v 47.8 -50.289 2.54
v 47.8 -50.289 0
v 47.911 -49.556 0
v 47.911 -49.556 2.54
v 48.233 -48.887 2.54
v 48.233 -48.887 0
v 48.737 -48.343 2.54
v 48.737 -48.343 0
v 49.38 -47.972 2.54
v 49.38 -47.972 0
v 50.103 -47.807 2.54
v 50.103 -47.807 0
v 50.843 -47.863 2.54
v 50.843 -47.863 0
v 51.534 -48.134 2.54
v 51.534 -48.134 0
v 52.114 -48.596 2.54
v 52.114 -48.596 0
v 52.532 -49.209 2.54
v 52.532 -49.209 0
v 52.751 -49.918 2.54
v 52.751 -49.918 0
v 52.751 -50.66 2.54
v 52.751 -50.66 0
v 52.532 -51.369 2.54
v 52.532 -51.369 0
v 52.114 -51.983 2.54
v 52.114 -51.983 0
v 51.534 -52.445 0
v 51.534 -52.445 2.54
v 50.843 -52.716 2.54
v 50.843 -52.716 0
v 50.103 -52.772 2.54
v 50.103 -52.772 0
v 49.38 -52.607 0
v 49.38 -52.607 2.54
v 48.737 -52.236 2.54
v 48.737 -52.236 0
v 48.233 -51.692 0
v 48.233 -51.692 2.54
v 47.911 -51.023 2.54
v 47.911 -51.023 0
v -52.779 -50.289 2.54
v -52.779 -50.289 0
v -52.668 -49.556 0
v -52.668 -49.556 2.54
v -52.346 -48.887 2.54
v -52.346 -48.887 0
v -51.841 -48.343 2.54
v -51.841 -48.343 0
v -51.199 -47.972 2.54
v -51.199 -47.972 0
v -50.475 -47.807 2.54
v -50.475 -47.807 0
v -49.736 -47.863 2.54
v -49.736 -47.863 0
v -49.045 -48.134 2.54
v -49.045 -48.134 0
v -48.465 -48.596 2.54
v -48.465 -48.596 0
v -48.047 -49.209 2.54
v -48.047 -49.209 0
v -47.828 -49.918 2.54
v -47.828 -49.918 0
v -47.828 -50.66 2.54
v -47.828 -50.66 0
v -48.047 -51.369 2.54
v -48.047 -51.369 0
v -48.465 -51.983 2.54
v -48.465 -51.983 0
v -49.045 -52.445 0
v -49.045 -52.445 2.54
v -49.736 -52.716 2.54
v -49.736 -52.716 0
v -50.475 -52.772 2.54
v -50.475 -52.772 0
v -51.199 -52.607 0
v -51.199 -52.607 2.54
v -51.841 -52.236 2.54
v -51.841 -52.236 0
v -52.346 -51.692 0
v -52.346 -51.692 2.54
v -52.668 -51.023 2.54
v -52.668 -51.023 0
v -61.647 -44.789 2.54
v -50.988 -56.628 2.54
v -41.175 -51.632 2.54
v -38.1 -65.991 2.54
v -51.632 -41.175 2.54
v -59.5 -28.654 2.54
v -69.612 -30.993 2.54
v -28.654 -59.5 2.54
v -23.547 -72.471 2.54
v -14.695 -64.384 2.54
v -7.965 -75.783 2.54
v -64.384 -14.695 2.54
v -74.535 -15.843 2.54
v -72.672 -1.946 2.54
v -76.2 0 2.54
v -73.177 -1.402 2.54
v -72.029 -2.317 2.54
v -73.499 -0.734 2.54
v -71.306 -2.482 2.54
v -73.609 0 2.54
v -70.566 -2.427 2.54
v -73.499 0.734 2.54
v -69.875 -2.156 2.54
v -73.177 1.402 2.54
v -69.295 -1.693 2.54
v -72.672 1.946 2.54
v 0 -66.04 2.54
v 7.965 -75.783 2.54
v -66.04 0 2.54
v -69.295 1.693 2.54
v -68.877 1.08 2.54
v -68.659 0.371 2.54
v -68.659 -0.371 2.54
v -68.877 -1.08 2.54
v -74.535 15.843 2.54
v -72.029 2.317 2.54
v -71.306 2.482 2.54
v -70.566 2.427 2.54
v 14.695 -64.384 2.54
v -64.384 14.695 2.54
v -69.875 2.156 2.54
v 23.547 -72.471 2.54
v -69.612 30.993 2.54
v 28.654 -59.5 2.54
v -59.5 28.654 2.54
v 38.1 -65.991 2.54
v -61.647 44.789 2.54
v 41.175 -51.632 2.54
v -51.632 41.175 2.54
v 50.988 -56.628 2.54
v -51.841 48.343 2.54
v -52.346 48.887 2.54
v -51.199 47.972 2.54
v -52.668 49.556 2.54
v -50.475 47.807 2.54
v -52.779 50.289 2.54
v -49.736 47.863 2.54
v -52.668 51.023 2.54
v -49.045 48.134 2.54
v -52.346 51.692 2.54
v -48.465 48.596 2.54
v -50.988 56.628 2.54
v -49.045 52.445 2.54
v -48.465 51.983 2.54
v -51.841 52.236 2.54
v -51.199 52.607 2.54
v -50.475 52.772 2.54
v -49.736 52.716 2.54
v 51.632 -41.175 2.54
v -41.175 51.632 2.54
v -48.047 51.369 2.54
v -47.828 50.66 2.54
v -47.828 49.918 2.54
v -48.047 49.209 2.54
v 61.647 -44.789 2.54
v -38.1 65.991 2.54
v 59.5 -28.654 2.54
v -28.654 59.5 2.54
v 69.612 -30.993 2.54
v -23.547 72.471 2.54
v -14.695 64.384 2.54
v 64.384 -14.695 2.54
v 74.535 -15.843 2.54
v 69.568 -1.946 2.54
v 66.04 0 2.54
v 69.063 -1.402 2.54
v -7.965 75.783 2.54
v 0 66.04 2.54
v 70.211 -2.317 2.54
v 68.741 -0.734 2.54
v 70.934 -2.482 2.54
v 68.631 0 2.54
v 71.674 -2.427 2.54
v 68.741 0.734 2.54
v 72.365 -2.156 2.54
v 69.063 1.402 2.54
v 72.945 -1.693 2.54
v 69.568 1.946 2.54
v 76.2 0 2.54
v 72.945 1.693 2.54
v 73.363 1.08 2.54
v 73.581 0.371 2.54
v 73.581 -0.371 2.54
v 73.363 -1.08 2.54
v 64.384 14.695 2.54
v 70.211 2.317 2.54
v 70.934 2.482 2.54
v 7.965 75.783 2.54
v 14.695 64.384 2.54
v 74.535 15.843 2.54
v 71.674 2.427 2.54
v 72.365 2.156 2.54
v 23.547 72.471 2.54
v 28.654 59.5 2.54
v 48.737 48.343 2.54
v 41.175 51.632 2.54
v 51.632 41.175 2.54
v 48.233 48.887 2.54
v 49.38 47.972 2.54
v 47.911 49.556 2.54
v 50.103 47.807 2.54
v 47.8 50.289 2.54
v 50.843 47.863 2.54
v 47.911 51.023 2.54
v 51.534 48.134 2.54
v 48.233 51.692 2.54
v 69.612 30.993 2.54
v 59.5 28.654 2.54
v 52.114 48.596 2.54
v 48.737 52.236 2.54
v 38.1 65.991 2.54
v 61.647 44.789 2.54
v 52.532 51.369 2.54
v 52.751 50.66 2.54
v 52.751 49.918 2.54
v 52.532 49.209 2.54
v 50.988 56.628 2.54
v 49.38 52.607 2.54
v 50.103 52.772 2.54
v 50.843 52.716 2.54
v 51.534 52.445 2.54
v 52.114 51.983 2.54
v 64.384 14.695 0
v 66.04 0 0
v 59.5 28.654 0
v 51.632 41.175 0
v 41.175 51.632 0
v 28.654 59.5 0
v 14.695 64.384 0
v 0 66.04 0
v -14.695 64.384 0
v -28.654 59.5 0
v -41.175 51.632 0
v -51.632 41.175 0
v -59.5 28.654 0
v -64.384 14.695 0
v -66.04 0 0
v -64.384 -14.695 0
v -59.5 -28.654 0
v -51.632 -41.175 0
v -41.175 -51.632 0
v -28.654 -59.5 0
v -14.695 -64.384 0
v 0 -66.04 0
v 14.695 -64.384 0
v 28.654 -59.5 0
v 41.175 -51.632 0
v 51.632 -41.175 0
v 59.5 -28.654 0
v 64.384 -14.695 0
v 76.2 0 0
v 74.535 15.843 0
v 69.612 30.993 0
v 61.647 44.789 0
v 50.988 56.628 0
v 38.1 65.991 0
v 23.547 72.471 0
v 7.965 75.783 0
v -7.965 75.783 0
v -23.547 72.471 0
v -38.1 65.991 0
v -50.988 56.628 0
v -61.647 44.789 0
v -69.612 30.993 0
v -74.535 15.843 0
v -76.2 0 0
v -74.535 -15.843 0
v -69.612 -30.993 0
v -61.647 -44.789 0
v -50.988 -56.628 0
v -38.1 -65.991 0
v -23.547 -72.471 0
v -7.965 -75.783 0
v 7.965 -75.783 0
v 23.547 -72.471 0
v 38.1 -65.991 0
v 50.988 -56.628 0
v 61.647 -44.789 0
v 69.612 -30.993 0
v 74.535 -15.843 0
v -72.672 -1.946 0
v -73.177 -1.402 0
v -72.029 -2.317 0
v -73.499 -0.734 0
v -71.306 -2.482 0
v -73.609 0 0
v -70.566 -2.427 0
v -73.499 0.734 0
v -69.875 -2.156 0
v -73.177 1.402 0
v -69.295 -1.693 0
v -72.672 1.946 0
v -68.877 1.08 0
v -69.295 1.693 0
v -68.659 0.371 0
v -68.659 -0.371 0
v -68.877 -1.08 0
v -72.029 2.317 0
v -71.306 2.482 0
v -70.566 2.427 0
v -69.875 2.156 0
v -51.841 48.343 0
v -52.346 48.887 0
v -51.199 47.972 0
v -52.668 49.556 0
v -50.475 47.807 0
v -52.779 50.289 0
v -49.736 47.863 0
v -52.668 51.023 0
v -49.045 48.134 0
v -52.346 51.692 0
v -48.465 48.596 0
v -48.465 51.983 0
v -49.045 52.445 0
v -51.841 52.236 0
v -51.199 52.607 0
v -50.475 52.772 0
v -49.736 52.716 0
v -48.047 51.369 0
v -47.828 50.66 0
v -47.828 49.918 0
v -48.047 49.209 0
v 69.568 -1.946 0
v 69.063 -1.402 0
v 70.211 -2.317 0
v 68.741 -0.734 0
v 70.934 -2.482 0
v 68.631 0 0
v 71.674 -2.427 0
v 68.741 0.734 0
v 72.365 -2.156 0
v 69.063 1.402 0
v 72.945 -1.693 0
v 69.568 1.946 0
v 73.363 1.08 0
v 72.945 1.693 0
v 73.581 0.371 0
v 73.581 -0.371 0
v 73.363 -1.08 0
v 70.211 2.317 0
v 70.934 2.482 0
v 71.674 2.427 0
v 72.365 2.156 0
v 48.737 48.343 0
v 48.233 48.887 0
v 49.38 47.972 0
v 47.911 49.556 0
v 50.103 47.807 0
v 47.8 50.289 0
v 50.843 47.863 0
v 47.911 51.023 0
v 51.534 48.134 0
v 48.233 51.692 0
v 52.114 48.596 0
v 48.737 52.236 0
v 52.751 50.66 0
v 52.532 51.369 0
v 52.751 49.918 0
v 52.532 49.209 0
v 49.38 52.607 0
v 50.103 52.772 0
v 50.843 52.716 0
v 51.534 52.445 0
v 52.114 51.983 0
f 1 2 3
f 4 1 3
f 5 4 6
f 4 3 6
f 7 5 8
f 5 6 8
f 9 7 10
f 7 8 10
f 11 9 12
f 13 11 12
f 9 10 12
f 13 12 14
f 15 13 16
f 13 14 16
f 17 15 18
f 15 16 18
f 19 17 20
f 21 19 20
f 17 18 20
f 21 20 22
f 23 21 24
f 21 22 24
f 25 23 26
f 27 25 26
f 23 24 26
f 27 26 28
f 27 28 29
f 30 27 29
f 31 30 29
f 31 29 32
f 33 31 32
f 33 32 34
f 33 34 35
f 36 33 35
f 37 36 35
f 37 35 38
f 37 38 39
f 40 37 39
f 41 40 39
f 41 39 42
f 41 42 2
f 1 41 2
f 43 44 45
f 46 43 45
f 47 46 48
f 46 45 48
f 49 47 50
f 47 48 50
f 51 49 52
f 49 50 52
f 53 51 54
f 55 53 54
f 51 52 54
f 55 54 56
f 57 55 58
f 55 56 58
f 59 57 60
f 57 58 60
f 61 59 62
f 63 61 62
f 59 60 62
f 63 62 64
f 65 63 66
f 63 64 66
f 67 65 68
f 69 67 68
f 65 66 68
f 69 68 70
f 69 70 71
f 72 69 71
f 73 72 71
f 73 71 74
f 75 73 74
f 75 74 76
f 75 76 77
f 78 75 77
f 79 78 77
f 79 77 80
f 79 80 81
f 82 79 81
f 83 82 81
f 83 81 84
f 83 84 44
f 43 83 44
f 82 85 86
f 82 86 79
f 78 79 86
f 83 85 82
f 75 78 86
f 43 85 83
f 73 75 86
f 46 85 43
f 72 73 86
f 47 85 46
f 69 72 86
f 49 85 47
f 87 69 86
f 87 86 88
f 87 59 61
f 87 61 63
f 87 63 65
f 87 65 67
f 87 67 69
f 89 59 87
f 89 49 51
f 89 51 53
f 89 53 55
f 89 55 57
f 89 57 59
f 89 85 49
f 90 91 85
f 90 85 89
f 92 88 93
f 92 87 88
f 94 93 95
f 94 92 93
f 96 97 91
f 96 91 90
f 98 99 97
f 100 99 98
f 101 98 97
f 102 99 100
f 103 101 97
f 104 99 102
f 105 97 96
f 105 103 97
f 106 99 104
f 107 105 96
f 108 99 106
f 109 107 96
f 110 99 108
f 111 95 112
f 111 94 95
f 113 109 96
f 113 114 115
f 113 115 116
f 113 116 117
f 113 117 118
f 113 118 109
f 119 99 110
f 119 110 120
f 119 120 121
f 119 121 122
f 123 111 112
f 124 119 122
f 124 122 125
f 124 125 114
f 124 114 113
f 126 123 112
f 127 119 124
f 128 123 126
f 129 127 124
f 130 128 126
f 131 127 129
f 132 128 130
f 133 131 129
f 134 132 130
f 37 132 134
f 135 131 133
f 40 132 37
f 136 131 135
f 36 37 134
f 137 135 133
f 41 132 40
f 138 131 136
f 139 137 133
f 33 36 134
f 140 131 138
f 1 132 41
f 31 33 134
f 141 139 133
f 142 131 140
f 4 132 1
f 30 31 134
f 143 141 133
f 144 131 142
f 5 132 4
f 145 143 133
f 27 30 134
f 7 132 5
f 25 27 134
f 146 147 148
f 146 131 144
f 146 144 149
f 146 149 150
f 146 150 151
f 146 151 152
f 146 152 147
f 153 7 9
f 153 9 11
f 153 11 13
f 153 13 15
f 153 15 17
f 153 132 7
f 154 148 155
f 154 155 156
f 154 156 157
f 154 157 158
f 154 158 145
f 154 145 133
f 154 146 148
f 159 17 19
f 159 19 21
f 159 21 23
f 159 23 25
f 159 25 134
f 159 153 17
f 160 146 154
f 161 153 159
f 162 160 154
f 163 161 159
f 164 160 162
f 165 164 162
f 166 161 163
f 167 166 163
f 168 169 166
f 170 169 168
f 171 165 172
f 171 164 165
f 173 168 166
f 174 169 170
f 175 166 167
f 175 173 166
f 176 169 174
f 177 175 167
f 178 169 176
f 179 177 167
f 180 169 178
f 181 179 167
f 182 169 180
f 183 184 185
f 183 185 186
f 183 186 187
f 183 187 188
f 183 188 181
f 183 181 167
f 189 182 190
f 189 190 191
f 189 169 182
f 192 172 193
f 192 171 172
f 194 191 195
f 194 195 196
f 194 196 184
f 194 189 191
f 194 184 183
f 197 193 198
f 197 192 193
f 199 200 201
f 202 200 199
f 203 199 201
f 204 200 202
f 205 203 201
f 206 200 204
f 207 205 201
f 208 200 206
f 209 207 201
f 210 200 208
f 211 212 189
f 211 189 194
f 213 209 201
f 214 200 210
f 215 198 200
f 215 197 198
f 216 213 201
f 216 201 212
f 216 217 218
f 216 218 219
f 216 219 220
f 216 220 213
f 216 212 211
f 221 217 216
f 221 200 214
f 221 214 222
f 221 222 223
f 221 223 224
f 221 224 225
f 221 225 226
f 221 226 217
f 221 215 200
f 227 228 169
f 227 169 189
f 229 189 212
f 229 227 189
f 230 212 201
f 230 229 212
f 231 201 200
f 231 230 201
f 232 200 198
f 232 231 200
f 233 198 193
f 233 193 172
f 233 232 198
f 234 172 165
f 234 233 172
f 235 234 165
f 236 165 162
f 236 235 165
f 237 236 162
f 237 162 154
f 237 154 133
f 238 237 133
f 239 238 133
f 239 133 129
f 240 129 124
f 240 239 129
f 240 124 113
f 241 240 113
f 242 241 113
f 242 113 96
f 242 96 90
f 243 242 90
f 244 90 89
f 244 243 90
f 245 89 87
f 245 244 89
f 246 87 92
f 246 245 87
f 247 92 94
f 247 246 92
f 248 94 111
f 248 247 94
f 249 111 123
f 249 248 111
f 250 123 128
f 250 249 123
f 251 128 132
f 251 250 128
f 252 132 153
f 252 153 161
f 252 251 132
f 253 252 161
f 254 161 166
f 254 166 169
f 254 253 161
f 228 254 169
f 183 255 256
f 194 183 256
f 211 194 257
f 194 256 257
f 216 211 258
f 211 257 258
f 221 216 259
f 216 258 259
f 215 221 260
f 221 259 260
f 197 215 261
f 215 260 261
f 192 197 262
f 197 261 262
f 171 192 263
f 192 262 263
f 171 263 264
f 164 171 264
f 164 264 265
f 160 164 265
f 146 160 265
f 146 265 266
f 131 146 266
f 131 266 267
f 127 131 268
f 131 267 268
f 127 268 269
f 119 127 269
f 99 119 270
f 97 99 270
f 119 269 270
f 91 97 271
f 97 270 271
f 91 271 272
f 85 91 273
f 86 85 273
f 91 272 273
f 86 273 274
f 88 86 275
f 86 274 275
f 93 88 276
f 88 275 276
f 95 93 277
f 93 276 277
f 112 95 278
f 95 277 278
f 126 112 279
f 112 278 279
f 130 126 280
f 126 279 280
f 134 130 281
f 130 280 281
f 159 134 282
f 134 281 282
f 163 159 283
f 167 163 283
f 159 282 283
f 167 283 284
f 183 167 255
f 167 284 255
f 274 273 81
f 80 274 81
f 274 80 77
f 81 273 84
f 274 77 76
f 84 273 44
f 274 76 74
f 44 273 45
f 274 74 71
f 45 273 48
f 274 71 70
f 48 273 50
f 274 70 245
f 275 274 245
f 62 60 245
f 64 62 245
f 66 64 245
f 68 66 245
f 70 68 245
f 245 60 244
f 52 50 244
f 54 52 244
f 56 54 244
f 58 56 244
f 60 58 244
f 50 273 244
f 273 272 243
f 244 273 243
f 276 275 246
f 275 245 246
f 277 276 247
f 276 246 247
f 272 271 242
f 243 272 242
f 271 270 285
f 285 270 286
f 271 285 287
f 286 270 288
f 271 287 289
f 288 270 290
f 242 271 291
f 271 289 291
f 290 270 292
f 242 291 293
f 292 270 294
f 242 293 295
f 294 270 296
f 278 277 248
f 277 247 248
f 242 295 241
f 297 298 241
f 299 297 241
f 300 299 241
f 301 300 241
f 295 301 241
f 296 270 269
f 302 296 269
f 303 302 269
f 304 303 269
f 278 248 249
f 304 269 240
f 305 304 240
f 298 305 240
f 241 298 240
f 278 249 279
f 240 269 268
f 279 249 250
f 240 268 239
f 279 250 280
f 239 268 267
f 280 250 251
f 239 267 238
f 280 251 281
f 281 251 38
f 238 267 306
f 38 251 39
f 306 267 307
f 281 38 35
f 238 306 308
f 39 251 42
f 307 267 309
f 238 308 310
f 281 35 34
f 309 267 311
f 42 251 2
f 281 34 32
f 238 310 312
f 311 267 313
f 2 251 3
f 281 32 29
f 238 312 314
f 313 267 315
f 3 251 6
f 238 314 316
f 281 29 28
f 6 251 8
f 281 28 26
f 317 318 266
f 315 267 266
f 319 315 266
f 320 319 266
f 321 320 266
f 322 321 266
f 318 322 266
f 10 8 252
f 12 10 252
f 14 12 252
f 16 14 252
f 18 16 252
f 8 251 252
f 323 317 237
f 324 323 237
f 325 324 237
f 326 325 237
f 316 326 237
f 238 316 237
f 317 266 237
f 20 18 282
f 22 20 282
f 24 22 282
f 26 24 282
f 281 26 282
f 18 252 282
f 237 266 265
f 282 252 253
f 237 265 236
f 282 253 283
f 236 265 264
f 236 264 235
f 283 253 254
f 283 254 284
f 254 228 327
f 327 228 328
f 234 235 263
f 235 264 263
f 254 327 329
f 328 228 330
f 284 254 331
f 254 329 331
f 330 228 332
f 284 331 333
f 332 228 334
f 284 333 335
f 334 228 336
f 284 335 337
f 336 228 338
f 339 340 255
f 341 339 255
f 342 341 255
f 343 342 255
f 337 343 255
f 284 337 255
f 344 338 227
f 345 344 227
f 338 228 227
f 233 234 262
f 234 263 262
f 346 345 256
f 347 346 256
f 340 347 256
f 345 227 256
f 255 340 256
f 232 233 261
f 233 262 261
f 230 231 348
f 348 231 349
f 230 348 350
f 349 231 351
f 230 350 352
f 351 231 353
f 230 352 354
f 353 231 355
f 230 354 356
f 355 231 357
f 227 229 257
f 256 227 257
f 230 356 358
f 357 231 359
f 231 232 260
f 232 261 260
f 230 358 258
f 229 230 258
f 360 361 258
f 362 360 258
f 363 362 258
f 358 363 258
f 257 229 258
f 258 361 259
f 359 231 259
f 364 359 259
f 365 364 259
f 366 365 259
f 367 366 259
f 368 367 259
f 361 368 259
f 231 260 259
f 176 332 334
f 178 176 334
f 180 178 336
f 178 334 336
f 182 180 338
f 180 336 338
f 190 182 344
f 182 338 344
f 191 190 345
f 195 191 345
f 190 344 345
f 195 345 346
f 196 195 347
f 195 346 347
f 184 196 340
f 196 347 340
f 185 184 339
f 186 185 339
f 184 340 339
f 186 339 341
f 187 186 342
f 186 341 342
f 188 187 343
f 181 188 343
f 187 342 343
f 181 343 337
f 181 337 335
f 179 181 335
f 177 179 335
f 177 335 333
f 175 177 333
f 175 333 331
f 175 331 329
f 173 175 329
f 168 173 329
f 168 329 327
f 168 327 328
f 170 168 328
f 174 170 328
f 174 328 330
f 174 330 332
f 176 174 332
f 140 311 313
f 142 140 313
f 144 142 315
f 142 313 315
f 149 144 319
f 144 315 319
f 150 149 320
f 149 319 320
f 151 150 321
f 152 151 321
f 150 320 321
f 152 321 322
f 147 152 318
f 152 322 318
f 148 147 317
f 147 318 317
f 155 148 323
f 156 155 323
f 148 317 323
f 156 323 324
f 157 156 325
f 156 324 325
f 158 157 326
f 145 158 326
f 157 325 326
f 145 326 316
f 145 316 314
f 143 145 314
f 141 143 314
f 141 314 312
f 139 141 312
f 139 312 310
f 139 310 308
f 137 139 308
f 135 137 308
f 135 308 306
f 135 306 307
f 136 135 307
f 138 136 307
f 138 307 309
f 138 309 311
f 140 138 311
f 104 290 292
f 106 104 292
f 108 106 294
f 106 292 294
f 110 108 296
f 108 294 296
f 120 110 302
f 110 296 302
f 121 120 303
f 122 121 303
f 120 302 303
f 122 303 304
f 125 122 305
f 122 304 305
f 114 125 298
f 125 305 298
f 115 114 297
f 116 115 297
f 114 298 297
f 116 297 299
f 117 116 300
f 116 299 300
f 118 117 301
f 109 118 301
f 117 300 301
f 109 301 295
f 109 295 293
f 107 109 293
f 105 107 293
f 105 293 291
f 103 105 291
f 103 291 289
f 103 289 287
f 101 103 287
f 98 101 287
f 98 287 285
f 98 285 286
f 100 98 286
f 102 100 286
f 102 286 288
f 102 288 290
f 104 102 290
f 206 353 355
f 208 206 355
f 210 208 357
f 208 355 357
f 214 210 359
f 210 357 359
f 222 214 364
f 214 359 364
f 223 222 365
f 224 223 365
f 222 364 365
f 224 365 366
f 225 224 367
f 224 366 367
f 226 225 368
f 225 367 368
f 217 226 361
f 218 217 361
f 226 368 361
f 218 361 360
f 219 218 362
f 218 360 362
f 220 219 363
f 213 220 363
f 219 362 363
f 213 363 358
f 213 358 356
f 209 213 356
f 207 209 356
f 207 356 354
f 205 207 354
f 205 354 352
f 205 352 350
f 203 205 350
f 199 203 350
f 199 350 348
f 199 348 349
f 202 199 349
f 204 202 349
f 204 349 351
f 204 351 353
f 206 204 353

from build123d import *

# Parameters (mm, degrees)
SKETCH1_R                  = 76.2
SKETCH1_R_2                = 66.04
BOSS_EXTRUDE1_DEPTH        = 2.54
F_10_CLEARANCE_HOLE1_D     = 4.9784
F_10_CLEARANCE_HOLE1_DEPTH = 38.354
F_10_CLEARANCE_HOLE1_TIP   = 1.495662253


with BuildPart() as part:
    # Sketch1 → Boss-Extrude1 (new body)
    with BuildSketch(Plane.XY):
        Circle(SKETCH1_R)
        Circle(SKETCH1_R_2, mode=Mode.SUBTRACT)
    extrude(amount=BOSS_EXTRUDE1_DEPTH)

    # #10 Clearance Hole1
    with Locations(Plane.XY.offset(2.54)):
        with Locations((-50.289434278, 50.289434278), (-71.12, 0), (-50.289434278, -50.289434278), (50.289434278, -50.289434278), (71.12, 0), (50.289434278, 50.289434278)):
            Hole(F_10_CLEARANCE_HOLE1_D / 2, depth=F_10_CLEARANCE_HOLE1_DEPTH)
            with Locations((0, 0, -(F_10_CLEARANCE_HOLE1_DEPTH + F_10_CLEARANCE_HOLE1_TIP / 2))):  # 118° drill point
                Cone(0, F_10_CLEARANCE_HOLE1_D / 2, F_10_CLEARANCE_HOLE1_TIP, mode=Mode.SUBTRACT)


solid = part.part
